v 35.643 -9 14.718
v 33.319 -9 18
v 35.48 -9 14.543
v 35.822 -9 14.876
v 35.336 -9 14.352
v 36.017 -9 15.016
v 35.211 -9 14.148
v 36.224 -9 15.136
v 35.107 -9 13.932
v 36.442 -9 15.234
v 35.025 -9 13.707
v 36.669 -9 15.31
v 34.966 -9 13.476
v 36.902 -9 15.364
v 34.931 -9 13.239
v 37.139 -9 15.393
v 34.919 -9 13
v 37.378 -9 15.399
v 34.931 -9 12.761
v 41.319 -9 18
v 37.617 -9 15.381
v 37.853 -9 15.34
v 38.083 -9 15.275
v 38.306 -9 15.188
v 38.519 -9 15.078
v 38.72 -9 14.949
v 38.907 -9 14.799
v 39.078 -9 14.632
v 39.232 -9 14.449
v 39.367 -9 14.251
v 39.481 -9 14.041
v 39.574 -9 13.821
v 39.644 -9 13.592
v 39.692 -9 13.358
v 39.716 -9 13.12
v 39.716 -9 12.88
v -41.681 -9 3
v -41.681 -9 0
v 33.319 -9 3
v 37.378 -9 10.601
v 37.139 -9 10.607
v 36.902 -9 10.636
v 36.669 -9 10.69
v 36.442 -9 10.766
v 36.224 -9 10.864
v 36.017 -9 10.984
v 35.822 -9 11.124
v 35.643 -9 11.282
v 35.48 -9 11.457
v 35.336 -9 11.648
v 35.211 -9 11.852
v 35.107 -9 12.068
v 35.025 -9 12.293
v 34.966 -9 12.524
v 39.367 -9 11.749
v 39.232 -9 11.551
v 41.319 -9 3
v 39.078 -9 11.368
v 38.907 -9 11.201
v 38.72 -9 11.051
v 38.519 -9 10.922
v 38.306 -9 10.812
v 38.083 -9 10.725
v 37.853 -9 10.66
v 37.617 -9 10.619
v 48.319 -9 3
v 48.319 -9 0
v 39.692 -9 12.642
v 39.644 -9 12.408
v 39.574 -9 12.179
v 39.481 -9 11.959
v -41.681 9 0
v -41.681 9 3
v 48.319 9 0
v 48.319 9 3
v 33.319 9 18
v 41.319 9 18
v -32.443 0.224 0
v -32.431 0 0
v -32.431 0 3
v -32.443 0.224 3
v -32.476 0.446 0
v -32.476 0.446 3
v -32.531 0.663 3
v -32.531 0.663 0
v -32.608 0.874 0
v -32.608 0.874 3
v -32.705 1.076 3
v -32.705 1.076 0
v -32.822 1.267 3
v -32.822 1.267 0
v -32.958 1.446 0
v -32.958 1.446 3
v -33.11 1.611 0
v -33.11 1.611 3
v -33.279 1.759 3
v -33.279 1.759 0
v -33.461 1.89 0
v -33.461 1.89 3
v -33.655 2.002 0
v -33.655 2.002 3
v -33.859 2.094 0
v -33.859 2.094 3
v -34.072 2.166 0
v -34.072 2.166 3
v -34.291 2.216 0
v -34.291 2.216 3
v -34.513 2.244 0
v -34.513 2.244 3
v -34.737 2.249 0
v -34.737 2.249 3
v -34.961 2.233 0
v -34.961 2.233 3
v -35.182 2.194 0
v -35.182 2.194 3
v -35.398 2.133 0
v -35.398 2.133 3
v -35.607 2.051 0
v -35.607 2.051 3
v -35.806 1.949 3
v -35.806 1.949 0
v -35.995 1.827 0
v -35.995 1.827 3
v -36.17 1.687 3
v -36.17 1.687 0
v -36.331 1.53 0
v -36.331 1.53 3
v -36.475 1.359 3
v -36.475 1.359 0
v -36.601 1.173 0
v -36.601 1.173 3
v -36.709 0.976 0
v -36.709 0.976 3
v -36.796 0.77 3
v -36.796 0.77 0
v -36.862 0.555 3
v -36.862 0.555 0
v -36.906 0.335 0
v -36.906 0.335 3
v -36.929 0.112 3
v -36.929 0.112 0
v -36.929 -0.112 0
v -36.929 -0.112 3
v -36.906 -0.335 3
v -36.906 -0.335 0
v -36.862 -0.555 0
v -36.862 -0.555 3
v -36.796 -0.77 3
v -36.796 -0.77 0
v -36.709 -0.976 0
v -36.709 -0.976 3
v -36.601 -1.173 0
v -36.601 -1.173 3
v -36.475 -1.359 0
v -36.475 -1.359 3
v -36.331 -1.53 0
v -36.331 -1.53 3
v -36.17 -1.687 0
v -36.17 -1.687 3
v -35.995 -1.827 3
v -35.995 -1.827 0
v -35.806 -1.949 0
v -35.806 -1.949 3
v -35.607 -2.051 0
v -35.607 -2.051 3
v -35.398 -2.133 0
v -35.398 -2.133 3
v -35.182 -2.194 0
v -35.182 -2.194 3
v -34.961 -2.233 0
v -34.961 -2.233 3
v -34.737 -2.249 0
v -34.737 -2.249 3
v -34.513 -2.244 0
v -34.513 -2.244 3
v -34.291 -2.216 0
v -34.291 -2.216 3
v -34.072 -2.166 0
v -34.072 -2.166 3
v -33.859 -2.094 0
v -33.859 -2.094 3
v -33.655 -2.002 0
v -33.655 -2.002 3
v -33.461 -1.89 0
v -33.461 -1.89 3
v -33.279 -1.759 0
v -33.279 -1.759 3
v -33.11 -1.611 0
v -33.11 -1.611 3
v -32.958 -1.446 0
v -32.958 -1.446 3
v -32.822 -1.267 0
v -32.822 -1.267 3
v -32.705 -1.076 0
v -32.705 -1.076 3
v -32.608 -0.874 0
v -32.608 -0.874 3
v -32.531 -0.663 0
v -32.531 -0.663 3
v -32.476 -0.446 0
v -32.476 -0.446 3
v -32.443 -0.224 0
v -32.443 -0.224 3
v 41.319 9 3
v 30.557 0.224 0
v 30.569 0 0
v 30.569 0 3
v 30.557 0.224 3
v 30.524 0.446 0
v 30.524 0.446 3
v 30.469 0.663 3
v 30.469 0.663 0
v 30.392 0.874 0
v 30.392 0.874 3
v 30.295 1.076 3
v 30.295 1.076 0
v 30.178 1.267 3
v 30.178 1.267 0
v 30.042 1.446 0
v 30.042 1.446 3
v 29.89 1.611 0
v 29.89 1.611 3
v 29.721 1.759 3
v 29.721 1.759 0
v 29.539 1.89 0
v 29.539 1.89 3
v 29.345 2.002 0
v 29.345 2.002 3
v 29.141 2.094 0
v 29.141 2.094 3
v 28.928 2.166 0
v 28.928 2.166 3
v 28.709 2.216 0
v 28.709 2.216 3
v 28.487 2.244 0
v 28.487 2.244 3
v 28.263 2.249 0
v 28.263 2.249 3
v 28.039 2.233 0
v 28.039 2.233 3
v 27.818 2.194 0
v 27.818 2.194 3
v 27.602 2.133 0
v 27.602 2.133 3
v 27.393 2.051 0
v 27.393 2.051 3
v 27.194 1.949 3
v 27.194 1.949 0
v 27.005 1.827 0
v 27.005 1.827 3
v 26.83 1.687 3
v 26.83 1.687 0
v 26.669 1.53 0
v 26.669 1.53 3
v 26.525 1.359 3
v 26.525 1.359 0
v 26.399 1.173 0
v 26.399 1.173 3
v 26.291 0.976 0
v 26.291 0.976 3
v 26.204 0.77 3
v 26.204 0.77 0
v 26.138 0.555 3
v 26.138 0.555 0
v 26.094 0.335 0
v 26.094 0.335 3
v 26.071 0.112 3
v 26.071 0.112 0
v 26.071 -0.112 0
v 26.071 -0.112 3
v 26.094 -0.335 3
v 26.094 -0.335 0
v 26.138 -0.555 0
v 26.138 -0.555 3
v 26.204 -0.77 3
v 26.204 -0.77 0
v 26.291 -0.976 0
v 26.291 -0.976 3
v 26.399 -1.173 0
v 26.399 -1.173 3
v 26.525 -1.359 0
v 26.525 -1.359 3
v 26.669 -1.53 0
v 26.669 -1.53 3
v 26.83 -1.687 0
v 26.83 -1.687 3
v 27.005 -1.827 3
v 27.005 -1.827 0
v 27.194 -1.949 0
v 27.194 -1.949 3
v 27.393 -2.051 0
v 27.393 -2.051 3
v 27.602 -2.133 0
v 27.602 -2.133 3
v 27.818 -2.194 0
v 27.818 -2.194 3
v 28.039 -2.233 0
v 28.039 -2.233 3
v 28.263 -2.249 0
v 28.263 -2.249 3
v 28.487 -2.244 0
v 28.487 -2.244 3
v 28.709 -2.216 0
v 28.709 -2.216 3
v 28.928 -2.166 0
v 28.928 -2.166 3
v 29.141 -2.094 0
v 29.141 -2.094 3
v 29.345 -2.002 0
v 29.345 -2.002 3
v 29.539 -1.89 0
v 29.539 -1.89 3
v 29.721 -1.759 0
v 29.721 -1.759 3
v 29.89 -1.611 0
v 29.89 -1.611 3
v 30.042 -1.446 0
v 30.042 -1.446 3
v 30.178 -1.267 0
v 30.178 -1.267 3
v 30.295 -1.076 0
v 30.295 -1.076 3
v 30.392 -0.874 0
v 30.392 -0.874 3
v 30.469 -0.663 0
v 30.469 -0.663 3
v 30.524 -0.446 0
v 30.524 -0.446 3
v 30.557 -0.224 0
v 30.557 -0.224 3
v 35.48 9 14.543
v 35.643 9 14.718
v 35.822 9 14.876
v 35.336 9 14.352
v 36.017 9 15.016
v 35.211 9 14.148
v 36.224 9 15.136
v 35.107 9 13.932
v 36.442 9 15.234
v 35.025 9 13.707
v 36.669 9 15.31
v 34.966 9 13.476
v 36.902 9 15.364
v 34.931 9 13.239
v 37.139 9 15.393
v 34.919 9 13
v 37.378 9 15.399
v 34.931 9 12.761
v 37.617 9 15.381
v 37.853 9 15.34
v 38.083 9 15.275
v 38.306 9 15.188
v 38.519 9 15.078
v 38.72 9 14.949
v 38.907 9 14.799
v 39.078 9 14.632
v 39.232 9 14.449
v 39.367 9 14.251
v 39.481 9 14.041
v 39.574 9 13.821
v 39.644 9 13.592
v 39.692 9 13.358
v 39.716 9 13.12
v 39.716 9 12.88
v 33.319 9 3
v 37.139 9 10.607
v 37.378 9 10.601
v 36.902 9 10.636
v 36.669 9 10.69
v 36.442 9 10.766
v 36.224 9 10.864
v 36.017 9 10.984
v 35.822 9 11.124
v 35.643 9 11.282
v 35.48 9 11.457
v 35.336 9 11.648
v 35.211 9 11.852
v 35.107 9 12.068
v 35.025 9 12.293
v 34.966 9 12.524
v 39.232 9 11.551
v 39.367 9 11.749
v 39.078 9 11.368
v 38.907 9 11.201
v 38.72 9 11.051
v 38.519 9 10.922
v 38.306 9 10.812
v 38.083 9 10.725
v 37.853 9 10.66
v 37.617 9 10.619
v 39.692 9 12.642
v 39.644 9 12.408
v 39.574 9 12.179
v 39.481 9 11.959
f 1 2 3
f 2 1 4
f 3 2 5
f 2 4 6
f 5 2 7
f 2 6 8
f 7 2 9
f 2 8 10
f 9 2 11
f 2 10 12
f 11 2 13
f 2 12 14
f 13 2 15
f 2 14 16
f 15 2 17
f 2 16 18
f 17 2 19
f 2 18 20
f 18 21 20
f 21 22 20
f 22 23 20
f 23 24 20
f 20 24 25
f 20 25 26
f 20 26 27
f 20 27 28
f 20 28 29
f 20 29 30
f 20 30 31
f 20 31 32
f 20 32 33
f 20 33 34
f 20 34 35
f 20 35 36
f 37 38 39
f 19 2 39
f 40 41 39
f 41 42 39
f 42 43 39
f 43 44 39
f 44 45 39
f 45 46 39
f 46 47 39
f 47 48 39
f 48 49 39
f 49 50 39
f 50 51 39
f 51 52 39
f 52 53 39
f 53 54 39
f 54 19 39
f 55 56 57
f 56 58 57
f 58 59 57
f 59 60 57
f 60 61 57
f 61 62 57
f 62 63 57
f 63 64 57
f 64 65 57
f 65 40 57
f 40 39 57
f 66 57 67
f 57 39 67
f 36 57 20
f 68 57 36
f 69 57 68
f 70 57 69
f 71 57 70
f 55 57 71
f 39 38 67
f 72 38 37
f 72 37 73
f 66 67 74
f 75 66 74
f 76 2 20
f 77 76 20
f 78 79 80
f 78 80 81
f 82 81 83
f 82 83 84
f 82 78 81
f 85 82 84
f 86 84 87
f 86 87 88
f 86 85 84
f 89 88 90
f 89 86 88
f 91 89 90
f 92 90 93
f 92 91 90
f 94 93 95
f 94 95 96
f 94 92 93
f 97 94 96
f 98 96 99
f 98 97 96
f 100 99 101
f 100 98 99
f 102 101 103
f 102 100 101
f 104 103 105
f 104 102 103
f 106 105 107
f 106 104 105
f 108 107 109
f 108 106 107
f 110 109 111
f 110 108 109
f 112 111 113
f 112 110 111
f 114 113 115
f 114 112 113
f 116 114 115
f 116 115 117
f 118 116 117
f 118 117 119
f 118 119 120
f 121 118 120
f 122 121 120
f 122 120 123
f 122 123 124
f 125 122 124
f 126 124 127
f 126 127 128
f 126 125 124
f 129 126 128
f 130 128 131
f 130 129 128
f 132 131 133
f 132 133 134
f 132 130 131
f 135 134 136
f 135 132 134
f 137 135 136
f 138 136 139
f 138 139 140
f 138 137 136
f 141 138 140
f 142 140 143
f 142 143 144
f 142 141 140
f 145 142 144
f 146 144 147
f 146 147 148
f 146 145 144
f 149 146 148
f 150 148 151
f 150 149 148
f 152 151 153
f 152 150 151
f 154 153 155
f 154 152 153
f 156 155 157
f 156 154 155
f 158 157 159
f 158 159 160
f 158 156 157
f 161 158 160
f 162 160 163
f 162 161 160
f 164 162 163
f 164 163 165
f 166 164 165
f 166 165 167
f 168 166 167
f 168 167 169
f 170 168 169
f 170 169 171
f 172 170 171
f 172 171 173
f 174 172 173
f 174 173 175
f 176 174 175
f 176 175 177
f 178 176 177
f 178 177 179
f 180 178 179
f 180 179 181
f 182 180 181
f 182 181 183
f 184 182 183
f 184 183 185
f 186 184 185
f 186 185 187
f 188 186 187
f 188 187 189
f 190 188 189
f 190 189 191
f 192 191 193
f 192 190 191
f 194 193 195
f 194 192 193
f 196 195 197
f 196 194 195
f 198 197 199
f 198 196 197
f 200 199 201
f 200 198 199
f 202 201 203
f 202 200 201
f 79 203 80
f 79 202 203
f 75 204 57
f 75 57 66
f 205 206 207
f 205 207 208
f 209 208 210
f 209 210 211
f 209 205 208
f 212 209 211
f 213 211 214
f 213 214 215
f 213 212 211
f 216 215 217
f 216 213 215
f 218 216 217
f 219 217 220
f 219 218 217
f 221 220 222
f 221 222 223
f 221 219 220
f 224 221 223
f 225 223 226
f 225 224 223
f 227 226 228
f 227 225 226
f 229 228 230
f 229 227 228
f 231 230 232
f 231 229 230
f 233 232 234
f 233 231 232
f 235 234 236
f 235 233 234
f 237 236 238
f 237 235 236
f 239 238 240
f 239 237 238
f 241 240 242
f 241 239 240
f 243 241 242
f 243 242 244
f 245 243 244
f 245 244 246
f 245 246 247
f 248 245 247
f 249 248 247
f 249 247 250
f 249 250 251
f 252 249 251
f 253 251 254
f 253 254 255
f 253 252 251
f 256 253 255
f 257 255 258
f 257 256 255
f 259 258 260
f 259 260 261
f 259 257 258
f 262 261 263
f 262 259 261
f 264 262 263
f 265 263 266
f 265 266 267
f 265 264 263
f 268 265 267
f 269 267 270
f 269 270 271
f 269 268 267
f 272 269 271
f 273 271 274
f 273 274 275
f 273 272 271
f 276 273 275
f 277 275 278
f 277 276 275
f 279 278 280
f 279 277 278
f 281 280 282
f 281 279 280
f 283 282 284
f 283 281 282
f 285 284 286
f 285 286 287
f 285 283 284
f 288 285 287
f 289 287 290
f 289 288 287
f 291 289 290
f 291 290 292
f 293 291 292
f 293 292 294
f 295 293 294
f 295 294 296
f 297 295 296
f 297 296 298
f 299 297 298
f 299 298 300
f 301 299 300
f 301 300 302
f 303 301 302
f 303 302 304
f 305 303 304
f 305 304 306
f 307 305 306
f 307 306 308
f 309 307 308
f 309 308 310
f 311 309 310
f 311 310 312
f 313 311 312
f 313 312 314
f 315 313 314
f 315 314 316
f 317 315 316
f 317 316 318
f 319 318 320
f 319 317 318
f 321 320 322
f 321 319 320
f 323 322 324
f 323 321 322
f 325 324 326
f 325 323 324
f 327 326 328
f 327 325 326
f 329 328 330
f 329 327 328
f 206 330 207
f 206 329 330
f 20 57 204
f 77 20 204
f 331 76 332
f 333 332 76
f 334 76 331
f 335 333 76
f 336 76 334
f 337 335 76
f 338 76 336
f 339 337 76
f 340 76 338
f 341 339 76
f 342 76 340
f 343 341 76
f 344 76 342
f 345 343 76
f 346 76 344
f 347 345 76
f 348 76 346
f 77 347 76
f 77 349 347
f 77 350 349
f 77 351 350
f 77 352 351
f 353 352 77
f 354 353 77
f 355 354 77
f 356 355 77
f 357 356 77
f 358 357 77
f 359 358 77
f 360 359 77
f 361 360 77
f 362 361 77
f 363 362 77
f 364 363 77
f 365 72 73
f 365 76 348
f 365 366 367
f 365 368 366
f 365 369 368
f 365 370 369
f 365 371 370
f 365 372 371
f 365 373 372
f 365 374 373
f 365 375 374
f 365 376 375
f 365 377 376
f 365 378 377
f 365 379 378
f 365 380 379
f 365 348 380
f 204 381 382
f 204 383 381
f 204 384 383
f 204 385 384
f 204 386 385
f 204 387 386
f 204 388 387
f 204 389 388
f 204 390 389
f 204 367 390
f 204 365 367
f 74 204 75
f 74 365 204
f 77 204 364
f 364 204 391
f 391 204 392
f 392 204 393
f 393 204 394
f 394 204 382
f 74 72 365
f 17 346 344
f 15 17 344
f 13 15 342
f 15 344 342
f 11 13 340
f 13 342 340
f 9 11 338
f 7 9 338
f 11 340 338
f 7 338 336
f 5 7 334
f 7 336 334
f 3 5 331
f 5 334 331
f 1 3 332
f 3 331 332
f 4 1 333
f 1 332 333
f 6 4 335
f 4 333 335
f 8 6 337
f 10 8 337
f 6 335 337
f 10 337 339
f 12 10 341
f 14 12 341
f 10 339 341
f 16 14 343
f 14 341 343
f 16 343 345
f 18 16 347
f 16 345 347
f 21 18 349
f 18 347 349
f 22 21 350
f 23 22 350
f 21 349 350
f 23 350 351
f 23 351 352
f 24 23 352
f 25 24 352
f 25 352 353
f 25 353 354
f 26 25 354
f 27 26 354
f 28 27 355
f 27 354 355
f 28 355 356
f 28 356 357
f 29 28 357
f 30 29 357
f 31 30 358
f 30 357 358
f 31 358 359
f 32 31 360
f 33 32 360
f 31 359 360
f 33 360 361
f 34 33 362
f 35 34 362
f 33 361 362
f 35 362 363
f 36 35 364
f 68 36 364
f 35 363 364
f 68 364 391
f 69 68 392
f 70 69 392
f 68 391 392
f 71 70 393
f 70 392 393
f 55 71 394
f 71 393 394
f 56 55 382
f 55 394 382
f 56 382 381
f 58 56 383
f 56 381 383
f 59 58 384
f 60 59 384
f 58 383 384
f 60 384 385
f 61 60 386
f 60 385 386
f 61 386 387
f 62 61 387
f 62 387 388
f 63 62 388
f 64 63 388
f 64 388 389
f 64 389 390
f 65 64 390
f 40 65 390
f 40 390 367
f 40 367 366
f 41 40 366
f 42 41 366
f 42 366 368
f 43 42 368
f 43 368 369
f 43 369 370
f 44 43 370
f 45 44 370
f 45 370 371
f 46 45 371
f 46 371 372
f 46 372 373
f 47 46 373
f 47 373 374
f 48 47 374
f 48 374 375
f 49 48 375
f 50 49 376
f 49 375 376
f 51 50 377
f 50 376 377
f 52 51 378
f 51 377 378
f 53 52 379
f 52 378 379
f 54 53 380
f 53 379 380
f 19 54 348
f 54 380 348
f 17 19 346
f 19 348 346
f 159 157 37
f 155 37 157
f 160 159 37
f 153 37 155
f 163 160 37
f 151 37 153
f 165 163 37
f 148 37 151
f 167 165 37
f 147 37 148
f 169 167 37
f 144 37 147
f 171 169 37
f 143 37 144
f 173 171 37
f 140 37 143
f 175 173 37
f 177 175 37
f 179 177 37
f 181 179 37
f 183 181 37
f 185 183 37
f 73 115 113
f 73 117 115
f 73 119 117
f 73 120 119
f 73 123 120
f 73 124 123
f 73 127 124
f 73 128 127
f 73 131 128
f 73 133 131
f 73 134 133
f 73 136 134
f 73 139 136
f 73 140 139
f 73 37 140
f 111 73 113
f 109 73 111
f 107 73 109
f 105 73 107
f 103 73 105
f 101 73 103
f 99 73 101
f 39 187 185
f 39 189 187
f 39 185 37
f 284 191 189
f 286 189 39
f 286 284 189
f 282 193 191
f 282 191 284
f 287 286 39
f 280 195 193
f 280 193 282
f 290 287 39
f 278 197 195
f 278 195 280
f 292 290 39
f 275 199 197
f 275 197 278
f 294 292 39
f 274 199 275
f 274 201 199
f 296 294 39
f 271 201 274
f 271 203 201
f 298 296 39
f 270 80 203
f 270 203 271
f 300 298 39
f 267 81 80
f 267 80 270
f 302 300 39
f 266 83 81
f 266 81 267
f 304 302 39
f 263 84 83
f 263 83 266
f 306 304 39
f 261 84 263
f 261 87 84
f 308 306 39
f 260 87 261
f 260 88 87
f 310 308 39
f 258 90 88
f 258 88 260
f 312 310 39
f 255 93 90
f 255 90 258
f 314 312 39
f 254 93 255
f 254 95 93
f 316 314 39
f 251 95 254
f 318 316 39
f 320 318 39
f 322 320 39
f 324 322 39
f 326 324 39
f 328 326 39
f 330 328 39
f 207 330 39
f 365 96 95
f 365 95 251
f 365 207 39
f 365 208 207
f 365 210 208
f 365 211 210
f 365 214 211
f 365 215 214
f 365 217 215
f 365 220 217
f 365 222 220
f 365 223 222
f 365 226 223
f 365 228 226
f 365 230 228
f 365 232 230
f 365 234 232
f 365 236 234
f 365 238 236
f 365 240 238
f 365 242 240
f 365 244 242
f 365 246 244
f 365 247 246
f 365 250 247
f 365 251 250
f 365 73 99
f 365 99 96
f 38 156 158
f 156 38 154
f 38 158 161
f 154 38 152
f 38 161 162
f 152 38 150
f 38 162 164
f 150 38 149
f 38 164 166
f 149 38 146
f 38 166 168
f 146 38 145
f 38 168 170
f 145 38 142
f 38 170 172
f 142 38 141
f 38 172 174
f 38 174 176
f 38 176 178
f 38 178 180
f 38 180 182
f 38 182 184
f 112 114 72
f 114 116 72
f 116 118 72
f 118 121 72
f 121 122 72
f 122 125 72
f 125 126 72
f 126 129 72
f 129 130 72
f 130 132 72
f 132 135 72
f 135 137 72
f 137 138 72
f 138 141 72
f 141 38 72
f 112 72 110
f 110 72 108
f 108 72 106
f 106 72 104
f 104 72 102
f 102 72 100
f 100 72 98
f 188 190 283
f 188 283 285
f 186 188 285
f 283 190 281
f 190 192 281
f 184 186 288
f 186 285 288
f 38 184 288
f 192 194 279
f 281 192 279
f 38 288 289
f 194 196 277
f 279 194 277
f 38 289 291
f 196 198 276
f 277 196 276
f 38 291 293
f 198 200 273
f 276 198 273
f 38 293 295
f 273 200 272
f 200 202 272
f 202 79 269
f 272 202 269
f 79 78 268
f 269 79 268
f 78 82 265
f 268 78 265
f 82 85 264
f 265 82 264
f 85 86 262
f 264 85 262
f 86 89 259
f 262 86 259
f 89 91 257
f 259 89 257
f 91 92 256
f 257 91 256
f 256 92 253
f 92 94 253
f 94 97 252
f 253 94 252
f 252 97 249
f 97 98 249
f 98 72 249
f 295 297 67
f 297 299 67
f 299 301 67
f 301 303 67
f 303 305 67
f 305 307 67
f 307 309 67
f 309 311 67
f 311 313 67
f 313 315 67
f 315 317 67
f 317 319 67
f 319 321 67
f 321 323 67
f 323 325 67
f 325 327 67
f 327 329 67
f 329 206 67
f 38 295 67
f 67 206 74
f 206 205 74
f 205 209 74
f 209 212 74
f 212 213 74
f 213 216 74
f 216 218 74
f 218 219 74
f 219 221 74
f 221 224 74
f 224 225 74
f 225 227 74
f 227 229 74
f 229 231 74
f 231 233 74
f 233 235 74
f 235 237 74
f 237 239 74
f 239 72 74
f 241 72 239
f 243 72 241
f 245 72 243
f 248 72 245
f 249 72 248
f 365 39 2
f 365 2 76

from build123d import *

# Parameters (mm, degrees)
F0_W     = 90
F0_H     = 18
F0_R     = 2.25
F1_DEPTH = 3
F2_W     = 8
F2_H     = 18
F3_DEPTH = 15
F4_R     = 2.4
F5_DEPTH = 18


with BuildPart() as f1:
    # F0 (on Top) → F1 (new body)
    with BuildSketch(Plane.XY):
        with Locations((3.318636, 0)):
            Rectangle(F0_W, F0_H)
        with Locations((-34.681364, 0)):
            Circle(F0_R, mode=Mode.SUBTRACT)
        with Locations((28.318636, 0)):
            Circle(F0_R, mode=Mode.SUBTRACT)
    extrude(amount=F1_DEPTH)

    # F2 (on face) → F3 (join)
    with BuildSketch(Plane.XY.offset(3)):
        with Locations((37.318636, 0)):
            Rectangle(F2_W, F2_H)
    extrude(amount=F3_DEPTH)

    # F4 (on face) → F5 (cut, through all)
    with BuildSketch(Plane(origin=(0, 9, 0), x_dir=(-1, 0, 0), z_dir=(0, 1, 0))):
        with Locations((-37.318636, 13)):
            Circle(F4_R)
    extrude(amount=-F5_DEPTH, mode=Mode.SUBTRACT)


solid = f1.part
